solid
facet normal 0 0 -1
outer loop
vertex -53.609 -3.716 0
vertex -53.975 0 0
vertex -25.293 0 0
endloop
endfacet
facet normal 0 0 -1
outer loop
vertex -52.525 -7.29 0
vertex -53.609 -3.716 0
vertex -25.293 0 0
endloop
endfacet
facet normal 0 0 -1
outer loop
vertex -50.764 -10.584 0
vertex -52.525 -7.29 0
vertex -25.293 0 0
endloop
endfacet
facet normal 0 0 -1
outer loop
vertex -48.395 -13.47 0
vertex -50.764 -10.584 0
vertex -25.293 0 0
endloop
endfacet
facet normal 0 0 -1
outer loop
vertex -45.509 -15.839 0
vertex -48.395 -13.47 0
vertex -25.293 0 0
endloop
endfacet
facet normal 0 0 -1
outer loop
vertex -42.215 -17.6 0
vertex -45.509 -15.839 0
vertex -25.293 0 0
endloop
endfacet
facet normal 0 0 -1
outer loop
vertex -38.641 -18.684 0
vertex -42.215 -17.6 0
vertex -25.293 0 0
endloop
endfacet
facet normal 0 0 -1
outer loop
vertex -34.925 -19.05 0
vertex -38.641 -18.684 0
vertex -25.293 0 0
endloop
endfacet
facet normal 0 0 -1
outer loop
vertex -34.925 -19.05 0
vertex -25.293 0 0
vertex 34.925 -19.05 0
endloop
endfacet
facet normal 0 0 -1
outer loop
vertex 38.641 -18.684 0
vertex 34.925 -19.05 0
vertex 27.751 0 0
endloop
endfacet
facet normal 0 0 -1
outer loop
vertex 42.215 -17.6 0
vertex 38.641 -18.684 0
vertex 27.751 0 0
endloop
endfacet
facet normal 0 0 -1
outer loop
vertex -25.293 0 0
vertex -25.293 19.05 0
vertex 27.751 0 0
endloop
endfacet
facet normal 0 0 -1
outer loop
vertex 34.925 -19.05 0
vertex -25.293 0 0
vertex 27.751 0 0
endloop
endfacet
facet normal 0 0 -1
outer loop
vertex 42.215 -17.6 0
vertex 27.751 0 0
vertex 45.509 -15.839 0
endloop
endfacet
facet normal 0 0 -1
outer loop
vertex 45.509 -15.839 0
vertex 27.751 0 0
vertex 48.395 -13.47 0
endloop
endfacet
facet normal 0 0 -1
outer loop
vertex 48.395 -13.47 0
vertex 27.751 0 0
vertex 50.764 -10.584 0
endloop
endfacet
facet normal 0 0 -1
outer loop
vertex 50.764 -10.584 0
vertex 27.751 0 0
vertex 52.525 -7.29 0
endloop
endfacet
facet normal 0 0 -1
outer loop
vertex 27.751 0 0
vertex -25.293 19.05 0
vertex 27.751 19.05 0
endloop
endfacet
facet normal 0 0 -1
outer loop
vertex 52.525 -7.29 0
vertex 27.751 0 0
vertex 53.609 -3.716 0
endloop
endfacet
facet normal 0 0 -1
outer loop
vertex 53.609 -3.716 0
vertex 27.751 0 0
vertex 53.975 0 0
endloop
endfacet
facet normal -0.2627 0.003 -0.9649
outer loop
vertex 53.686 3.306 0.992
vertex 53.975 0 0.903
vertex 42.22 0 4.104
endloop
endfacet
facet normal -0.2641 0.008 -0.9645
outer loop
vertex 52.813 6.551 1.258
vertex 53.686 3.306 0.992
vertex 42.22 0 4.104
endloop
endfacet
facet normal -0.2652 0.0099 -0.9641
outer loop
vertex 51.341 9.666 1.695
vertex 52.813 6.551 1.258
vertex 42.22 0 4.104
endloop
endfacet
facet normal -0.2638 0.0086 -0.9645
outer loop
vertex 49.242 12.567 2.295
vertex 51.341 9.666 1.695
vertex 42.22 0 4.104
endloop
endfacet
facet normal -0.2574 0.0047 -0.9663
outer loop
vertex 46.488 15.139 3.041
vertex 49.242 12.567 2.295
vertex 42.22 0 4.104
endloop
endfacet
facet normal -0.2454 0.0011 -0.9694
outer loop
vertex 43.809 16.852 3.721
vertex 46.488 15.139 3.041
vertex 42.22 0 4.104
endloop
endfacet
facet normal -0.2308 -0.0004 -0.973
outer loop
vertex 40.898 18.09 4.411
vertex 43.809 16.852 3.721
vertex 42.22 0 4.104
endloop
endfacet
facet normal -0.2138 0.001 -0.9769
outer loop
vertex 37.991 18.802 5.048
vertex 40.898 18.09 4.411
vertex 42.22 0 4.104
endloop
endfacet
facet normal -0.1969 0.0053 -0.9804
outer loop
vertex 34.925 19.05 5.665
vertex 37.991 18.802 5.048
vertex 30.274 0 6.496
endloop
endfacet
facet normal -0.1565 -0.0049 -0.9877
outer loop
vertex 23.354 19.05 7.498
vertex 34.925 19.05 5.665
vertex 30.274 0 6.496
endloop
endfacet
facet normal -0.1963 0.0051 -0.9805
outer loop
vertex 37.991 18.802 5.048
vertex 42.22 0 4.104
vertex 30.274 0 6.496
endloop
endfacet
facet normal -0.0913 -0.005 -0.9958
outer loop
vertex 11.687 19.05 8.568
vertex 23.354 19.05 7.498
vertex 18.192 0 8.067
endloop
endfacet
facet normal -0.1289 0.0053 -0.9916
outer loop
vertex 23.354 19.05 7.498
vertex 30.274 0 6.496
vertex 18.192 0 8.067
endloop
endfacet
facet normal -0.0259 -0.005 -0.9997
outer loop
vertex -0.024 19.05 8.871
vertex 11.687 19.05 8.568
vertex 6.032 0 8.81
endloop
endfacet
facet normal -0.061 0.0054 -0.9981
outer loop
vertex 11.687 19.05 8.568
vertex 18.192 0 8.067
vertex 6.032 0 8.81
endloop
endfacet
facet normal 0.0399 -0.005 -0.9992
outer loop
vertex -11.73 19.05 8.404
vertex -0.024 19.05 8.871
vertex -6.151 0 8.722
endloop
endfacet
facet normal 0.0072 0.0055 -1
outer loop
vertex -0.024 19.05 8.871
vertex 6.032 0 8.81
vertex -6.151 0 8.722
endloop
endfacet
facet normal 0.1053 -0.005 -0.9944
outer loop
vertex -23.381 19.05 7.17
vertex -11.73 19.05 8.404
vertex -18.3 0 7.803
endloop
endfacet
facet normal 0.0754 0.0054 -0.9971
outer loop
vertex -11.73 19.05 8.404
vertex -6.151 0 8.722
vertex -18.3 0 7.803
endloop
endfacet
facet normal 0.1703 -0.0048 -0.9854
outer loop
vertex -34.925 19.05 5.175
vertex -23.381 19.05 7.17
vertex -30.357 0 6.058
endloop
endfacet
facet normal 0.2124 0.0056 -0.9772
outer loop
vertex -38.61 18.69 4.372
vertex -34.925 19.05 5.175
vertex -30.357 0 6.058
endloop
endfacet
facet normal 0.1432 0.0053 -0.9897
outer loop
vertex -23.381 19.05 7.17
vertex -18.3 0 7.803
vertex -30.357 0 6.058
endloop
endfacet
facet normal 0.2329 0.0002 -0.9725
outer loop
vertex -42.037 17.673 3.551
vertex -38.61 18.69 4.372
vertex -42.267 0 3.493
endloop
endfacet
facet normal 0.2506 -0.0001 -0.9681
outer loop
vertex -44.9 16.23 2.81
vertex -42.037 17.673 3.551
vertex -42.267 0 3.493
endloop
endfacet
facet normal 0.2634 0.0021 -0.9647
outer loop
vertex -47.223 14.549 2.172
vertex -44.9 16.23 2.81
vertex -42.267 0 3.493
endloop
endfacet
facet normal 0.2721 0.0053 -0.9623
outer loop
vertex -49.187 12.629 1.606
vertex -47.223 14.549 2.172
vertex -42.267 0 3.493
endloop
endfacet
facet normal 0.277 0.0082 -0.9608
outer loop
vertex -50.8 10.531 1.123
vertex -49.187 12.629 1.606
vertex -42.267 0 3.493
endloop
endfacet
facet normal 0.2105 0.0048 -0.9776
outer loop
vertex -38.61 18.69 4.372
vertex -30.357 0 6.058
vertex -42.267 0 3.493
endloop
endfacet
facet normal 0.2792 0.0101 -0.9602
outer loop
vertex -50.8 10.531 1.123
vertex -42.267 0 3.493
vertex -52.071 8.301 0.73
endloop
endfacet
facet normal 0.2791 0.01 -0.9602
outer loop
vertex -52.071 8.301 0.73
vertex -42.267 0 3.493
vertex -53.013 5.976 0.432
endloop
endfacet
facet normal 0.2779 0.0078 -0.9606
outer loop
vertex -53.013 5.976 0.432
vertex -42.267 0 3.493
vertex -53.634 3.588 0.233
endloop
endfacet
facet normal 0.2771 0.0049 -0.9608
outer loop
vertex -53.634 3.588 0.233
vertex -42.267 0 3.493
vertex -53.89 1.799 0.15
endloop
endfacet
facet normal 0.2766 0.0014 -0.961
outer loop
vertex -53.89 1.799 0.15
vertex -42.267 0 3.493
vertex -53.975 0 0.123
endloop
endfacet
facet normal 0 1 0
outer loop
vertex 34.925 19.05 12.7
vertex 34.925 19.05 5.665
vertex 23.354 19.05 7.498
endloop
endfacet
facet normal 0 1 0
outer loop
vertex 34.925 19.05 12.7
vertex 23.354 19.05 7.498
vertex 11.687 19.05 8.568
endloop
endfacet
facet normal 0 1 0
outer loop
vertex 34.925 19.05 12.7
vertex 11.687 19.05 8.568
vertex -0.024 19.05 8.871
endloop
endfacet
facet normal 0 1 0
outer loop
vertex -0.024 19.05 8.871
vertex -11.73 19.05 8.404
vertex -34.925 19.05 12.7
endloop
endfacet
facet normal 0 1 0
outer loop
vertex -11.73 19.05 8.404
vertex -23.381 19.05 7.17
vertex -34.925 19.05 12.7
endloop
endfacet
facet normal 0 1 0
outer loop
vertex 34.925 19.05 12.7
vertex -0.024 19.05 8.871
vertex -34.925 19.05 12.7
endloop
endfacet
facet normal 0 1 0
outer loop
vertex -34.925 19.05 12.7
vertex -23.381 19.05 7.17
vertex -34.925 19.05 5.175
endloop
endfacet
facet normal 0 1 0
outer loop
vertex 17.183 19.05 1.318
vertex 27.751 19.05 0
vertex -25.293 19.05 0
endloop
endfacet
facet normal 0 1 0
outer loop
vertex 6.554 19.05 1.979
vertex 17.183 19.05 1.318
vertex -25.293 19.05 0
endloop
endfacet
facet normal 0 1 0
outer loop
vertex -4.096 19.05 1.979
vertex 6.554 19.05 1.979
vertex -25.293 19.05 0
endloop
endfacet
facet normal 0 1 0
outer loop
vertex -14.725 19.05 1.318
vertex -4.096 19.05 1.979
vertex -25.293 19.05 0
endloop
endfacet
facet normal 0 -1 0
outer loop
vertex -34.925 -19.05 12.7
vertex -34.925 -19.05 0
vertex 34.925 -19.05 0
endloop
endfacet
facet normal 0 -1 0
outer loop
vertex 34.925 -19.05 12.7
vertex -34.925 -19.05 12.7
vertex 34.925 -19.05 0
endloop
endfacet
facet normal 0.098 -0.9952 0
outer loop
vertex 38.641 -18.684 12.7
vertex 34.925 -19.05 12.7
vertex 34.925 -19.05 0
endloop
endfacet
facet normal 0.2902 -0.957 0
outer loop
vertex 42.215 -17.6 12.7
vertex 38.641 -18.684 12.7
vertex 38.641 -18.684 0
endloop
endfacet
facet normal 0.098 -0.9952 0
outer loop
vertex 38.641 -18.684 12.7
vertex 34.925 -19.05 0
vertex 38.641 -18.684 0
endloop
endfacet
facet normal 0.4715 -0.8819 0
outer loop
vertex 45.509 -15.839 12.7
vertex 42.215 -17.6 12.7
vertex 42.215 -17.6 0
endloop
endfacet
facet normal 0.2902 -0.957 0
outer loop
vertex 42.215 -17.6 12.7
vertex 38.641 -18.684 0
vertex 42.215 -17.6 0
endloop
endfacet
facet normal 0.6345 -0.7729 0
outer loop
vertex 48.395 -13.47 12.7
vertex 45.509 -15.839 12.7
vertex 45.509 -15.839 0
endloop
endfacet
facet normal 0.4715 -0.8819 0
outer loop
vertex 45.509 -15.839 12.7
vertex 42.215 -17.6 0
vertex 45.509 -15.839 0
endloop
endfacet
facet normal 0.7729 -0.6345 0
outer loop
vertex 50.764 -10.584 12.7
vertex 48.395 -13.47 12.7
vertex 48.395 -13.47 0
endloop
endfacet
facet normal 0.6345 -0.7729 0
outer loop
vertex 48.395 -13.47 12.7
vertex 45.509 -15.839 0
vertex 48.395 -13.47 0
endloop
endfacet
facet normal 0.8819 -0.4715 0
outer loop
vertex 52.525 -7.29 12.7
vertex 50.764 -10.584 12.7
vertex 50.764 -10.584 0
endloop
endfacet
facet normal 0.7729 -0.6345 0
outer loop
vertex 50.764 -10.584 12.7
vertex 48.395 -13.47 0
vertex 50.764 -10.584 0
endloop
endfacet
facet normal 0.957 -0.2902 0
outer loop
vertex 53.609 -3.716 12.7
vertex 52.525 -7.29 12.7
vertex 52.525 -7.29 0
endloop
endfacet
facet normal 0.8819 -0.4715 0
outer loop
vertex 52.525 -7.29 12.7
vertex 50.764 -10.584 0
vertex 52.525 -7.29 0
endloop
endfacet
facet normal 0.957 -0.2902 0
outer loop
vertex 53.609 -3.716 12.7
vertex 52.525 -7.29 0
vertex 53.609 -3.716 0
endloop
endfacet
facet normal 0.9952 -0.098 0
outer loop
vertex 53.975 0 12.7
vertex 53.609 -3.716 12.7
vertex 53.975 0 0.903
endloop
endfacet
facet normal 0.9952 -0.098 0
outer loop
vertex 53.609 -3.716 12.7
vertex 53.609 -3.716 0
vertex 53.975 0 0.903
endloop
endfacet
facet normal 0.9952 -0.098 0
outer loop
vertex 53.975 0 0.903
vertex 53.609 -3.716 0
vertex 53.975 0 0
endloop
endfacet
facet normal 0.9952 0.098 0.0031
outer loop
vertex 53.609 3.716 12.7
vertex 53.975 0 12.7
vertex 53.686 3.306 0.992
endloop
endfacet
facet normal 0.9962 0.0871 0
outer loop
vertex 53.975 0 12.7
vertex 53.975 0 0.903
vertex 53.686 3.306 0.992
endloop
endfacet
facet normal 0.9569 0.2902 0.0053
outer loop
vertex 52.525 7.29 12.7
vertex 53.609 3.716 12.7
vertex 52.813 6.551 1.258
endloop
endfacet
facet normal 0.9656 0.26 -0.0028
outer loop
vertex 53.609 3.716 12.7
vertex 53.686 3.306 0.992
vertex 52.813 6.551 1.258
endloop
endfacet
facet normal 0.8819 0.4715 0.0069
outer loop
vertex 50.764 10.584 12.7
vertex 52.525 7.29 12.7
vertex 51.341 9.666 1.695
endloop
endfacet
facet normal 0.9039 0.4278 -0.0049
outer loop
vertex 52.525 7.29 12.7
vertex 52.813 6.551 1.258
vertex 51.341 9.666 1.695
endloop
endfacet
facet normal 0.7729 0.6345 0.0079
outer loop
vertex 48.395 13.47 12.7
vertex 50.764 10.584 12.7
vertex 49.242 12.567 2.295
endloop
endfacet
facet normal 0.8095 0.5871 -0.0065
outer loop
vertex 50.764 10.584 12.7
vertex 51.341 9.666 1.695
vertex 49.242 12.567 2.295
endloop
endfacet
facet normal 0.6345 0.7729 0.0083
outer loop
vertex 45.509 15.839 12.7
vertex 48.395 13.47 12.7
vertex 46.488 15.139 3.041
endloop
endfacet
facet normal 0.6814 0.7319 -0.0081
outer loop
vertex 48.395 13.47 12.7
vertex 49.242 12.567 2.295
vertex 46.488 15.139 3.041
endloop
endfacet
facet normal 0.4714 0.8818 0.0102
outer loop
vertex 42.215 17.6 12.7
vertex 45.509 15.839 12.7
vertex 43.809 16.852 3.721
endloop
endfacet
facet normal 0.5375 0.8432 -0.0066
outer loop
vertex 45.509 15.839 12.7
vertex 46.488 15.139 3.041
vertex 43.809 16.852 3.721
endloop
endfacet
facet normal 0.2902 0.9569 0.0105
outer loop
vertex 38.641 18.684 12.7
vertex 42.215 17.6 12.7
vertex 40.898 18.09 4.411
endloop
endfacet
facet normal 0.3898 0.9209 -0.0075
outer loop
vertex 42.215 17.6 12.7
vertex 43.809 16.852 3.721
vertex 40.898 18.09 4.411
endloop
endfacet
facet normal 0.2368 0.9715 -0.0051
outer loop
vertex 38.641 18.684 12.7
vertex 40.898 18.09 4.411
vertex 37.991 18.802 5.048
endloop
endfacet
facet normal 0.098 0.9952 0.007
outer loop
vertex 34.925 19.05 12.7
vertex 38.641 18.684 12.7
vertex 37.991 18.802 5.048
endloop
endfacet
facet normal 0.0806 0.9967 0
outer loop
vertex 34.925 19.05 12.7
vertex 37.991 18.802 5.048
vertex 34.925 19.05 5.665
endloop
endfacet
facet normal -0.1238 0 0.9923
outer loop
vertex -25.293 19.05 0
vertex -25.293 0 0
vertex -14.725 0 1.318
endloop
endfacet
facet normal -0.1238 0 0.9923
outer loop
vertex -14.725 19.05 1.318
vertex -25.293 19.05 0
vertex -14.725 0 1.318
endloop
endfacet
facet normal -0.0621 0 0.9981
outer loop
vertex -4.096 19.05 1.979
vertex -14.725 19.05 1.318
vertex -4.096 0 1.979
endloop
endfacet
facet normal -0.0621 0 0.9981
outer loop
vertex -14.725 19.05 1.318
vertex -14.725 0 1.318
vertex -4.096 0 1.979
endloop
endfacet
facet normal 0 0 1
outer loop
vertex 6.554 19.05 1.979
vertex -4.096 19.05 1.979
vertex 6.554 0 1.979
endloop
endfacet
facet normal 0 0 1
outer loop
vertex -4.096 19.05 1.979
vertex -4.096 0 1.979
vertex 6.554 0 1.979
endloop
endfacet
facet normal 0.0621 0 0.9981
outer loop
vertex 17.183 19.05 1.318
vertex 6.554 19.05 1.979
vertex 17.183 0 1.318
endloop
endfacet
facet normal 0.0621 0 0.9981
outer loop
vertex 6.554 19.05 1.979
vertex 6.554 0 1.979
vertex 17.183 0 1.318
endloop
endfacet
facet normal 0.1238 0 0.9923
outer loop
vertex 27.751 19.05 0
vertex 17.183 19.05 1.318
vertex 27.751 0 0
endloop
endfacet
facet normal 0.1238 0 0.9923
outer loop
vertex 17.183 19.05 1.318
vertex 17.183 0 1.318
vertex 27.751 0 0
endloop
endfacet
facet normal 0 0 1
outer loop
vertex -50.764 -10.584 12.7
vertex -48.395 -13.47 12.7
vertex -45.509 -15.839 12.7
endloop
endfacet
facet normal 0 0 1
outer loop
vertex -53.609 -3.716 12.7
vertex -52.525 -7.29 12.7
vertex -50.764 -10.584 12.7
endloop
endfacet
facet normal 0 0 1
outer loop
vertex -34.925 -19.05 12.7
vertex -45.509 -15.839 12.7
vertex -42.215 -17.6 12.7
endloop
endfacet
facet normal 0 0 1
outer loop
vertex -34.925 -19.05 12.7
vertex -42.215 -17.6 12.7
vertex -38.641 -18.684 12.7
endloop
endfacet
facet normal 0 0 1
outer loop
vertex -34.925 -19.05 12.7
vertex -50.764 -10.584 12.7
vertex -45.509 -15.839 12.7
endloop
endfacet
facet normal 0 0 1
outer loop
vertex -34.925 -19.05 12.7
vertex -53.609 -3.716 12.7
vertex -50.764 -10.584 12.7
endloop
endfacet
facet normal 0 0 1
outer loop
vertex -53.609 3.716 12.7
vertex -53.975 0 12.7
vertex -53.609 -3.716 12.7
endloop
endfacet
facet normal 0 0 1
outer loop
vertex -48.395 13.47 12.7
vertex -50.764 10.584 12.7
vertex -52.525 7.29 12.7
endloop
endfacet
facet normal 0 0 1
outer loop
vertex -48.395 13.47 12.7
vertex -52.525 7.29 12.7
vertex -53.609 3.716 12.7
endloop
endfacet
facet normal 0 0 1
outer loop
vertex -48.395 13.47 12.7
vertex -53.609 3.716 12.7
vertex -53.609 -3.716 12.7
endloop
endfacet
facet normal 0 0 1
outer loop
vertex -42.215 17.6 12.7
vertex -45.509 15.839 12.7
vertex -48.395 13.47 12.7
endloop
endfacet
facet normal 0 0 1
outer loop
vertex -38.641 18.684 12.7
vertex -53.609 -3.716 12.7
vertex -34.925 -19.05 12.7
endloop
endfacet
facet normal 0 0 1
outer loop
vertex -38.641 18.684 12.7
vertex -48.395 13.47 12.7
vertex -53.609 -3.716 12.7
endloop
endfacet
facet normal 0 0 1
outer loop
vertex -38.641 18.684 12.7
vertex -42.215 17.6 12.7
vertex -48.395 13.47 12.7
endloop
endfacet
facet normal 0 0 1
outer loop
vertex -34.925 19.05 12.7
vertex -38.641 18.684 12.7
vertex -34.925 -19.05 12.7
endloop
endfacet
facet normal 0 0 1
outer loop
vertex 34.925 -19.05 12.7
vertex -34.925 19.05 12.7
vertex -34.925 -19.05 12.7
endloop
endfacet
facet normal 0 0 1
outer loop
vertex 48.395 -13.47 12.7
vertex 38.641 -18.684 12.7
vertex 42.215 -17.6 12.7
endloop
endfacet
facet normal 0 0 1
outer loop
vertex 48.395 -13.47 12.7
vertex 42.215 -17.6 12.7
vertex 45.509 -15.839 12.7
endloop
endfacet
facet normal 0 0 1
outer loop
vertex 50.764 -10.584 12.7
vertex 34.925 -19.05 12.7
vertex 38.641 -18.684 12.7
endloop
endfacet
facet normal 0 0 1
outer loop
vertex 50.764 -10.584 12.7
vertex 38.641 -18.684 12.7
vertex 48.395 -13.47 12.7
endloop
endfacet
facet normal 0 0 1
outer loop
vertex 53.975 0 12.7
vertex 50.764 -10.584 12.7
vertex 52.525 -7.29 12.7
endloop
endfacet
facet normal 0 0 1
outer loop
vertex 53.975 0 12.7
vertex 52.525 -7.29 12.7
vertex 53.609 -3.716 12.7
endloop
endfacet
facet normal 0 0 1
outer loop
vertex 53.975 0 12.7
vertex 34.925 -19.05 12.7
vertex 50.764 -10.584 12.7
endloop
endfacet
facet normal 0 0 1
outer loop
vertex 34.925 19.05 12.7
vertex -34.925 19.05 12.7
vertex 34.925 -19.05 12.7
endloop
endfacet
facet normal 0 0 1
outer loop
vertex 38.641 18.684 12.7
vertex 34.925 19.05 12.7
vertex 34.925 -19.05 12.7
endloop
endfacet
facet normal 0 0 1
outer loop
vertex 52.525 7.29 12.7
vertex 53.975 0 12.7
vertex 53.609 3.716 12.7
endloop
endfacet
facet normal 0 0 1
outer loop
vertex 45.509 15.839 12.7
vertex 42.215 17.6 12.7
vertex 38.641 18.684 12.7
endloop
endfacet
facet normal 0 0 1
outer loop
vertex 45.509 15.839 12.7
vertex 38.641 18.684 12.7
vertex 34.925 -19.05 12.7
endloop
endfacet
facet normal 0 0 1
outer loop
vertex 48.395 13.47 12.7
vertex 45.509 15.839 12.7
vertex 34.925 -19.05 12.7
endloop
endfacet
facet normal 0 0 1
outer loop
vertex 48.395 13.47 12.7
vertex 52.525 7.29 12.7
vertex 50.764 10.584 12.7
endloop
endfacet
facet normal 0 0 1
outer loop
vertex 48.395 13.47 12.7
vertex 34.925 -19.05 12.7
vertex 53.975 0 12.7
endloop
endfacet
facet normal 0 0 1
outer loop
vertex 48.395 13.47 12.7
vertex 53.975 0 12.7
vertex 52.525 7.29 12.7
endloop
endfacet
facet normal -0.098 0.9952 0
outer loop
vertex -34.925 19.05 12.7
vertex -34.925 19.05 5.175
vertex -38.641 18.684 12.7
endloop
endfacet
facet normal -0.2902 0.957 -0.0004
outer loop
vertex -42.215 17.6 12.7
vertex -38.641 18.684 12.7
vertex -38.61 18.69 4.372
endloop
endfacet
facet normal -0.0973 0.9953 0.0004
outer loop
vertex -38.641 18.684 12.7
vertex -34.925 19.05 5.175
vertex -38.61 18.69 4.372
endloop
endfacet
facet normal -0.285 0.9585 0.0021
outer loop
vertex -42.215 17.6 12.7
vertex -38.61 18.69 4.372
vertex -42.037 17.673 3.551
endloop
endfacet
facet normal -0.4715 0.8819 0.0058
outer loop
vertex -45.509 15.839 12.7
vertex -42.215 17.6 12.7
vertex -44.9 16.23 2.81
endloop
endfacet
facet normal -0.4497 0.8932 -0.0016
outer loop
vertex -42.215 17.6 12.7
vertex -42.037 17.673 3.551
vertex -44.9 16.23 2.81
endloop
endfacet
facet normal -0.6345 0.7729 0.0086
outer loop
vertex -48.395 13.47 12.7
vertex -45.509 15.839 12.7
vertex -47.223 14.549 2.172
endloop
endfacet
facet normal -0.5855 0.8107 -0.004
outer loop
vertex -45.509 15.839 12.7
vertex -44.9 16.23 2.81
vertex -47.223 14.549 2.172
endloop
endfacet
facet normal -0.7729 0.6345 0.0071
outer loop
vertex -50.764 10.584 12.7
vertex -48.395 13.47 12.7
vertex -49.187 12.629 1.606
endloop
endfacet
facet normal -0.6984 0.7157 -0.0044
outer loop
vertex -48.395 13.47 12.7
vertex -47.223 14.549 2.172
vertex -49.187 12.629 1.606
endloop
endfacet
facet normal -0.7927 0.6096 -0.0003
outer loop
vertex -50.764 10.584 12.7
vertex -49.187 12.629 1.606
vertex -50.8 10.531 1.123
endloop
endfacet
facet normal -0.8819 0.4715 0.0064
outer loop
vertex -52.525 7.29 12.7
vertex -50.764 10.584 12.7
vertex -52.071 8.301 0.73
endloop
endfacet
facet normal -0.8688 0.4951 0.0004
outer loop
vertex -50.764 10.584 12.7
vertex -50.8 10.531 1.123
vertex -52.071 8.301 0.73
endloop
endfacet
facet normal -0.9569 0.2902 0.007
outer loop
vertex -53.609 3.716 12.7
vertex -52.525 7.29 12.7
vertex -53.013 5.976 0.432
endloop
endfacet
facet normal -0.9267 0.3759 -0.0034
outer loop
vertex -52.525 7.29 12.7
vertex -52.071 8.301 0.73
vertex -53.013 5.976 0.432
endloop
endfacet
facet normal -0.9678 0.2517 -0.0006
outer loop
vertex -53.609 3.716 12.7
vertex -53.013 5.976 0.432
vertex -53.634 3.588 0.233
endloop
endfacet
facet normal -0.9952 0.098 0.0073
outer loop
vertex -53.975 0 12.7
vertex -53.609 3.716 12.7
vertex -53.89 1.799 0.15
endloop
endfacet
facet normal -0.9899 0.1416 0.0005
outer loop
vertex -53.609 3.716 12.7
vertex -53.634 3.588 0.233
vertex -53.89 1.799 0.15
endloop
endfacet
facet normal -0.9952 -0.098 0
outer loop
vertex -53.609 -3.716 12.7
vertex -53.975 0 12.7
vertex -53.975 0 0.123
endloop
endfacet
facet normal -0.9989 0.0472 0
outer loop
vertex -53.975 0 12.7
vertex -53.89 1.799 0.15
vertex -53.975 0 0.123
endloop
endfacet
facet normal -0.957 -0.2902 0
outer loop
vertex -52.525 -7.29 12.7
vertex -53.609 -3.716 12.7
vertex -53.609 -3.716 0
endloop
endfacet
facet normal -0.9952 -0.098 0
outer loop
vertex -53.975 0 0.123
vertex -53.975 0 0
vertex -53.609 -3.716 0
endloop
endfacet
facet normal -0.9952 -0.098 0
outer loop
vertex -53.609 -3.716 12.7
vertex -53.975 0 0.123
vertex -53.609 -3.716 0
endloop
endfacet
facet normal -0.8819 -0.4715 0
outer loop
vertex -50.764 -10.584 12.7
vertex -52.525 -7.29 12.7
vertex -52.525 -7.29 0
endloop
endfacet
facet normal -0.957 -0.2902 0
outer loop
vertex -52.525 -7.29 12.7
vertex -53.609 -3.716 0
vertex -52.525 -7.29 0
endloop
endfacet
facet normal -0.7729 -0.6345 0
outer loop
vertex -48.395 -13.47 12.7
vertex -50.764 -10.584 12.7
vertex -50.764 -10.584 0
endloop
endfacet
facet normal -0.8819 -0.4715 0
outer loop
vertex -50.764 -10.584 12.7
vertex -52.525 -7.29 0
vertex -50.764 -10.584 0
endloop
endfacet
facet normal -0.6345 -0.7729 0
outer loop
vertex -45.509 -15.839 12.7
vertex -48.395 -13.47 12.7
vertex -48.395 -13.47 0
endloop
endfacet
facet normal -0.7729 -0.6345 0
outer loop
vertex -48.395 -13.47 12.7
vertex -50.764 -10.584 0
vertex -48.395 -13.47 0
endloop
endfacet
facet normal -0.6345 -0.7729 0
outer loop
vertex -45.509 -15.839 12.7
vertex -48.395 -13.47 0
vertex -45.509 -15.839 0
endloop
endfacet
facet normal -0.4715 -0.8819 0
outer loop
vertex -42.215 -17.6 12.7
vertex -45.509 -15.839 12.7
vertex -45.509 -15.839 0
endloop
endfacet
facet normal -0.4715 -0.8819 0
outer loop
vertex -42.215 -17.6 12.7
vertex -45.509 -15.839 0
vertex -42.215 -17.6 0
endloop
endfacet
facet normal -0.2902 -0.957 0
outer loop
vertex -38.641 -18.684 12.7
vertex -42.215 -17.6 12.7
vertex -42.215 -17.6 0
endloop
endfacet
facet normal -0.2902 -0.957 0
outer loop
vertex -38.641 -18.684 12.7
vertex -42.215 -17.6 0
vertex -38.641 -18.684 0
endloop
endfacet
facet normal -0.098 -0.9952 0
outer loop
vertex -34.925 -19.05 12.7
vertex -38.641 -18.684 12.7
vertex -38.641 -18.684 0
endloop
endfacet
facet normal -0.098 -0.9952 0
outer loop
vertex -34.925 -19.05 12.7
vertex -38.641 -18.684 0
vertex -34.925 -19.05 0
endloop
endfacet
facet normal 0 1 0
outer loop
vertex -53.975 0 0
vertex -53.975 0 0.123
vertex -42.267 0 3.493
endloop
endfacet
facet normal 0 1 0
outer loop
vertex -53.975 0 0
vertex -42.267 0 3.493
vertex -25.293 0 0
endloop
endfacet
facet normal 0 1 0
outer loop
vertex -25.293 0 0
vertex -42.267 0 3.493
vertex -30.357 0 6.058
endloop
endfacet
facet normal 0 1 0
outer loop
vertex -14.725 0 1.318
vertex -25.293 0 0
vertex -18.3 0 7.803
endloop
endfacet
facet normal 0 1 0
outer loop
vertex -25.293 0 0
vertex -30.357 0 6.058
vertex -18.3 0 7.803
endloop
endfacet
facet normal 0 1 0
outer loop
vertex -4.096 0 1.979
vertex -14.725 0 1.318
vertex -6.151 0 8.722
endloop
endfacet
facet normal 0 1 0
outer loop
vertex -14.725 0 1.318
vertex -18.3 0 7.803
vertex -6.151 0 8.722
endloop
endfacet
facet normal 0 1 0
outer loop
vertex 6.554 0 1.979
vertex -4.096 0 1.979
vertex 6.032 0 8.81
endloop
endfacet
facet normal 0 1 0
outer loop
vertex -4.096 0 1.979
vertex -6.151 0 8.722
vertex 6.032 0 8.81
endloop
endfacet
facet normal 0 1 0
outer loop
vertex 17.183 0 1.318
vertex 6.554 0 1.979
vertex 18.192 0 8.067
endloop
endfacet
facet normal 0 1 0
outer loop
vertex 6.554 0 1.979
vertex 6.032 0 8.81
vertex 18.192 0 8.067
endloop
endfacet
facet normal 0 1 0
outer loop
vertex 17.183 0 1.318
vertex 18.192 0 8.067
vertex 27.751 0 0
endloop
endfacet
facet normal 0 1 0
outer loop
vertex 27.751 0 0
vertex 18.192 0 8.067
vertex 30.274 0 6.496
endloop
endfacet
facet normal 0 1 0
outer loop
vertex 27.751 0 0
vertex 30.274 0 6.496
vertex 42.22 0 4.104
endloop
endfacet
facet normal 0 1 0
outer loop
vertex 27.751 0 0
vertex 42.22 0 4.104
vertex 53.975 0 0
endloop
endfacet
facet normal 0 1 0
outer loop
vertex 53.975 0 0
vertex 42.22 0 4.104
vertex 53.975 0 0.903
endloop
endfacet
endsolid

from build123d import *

# Parameters (mm, degrees)
F1_DEPTH = 12.7
F3_DEPTH = 50.8


with BuildPart() as f1:
    # F0 (on Top) → F1 (new body)
    with BuildSketch(Plane.XY):
        with BuildLine():
            ThreePointArc((34.924999, -19.05), (53.974999, -1e-06), (34.925001, 19.05))
            Line((34.925001, 19.05), (-34.924999, 19.05))
            ThreePointArc((-34.924999, 19.05), (-53.975001, 1e-06), (-34.925001, -19.05))
            Line((-34.925001, -19.05), (34.924999, -19.05))
        make_face()
    extrude(amount=F1_DEPTH)

    # F2 (on Front) → F3 (cut)
    with BuildSketch(Plane.XZ):
        with BuildLine():
            ThreePointArc((-25.293126, 0), (1.228994, 2.061294), (27.751113, 0))
            Line((27.751113, 0), (56.808557, 0))
            ThreePointArc((56.808557, 0), (1.228994, 8.874986), (-54.35057, 0))
            Line((-54.35057, 0), (-25.293126, 0))
        make_face()
    extrude(amount=-F3_DEPTH, mode=Mode.SUBTRACT)


solid = f1.part
